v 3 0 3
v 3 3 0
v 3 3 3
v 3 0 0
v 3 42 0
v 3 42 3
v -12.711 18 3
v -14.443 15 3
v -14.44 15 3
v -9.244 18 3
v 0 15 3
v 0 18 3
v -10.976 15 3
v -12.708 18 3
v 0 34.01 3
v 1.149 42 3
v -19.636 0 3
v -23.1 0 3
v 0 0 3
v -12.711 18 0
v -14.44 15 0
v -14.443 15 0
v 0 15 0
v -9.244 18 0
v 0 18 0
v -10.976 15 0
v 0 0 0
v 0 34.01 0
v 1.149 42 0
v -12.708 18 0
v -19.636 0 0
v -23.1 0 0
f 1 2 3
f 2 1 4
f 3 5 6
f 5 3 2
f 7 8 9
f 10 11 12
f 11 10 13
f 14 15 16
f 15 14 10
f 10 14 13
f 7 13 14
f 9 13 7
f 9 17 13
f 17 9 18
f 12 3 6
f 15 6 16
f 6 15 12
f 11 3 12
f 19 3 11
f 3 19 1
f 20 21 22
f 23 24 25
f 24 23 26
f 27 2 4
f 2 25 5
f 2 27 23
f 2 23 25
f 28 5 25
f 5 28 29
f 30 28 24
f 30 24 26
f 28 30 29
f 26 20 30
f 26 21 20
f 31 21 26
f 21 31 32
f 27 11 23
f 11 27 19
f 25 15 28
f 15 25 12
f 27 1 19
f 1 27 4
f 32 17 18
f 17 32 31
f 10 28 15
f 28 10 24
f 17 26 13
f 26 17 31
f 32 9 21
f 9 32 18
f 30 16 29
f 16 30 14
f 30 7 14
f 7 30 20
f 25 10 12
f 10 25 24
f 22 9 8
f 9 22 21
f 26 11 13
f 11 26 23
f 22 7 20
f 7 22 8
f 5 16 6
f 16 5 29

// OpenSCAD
//A

union(){
    difference(){
union(){
 cube([3,40,3]);
 translate([-23.1,0,0]) rotate([0,0,-30])  cube([3,50,3]);
 translate([-15,15,0]) cube([20,3,3]);
}
 translate([-40,-8,-1]) cube([60,8,5]);
 translate([3,3,-1]) cube([10,40,5]);
 translate([-34.65,0,-1]) rotate([0,0,-30]) cube([10,40,5]);
 translate([0,42,-1]) cube(10);
}
}  
